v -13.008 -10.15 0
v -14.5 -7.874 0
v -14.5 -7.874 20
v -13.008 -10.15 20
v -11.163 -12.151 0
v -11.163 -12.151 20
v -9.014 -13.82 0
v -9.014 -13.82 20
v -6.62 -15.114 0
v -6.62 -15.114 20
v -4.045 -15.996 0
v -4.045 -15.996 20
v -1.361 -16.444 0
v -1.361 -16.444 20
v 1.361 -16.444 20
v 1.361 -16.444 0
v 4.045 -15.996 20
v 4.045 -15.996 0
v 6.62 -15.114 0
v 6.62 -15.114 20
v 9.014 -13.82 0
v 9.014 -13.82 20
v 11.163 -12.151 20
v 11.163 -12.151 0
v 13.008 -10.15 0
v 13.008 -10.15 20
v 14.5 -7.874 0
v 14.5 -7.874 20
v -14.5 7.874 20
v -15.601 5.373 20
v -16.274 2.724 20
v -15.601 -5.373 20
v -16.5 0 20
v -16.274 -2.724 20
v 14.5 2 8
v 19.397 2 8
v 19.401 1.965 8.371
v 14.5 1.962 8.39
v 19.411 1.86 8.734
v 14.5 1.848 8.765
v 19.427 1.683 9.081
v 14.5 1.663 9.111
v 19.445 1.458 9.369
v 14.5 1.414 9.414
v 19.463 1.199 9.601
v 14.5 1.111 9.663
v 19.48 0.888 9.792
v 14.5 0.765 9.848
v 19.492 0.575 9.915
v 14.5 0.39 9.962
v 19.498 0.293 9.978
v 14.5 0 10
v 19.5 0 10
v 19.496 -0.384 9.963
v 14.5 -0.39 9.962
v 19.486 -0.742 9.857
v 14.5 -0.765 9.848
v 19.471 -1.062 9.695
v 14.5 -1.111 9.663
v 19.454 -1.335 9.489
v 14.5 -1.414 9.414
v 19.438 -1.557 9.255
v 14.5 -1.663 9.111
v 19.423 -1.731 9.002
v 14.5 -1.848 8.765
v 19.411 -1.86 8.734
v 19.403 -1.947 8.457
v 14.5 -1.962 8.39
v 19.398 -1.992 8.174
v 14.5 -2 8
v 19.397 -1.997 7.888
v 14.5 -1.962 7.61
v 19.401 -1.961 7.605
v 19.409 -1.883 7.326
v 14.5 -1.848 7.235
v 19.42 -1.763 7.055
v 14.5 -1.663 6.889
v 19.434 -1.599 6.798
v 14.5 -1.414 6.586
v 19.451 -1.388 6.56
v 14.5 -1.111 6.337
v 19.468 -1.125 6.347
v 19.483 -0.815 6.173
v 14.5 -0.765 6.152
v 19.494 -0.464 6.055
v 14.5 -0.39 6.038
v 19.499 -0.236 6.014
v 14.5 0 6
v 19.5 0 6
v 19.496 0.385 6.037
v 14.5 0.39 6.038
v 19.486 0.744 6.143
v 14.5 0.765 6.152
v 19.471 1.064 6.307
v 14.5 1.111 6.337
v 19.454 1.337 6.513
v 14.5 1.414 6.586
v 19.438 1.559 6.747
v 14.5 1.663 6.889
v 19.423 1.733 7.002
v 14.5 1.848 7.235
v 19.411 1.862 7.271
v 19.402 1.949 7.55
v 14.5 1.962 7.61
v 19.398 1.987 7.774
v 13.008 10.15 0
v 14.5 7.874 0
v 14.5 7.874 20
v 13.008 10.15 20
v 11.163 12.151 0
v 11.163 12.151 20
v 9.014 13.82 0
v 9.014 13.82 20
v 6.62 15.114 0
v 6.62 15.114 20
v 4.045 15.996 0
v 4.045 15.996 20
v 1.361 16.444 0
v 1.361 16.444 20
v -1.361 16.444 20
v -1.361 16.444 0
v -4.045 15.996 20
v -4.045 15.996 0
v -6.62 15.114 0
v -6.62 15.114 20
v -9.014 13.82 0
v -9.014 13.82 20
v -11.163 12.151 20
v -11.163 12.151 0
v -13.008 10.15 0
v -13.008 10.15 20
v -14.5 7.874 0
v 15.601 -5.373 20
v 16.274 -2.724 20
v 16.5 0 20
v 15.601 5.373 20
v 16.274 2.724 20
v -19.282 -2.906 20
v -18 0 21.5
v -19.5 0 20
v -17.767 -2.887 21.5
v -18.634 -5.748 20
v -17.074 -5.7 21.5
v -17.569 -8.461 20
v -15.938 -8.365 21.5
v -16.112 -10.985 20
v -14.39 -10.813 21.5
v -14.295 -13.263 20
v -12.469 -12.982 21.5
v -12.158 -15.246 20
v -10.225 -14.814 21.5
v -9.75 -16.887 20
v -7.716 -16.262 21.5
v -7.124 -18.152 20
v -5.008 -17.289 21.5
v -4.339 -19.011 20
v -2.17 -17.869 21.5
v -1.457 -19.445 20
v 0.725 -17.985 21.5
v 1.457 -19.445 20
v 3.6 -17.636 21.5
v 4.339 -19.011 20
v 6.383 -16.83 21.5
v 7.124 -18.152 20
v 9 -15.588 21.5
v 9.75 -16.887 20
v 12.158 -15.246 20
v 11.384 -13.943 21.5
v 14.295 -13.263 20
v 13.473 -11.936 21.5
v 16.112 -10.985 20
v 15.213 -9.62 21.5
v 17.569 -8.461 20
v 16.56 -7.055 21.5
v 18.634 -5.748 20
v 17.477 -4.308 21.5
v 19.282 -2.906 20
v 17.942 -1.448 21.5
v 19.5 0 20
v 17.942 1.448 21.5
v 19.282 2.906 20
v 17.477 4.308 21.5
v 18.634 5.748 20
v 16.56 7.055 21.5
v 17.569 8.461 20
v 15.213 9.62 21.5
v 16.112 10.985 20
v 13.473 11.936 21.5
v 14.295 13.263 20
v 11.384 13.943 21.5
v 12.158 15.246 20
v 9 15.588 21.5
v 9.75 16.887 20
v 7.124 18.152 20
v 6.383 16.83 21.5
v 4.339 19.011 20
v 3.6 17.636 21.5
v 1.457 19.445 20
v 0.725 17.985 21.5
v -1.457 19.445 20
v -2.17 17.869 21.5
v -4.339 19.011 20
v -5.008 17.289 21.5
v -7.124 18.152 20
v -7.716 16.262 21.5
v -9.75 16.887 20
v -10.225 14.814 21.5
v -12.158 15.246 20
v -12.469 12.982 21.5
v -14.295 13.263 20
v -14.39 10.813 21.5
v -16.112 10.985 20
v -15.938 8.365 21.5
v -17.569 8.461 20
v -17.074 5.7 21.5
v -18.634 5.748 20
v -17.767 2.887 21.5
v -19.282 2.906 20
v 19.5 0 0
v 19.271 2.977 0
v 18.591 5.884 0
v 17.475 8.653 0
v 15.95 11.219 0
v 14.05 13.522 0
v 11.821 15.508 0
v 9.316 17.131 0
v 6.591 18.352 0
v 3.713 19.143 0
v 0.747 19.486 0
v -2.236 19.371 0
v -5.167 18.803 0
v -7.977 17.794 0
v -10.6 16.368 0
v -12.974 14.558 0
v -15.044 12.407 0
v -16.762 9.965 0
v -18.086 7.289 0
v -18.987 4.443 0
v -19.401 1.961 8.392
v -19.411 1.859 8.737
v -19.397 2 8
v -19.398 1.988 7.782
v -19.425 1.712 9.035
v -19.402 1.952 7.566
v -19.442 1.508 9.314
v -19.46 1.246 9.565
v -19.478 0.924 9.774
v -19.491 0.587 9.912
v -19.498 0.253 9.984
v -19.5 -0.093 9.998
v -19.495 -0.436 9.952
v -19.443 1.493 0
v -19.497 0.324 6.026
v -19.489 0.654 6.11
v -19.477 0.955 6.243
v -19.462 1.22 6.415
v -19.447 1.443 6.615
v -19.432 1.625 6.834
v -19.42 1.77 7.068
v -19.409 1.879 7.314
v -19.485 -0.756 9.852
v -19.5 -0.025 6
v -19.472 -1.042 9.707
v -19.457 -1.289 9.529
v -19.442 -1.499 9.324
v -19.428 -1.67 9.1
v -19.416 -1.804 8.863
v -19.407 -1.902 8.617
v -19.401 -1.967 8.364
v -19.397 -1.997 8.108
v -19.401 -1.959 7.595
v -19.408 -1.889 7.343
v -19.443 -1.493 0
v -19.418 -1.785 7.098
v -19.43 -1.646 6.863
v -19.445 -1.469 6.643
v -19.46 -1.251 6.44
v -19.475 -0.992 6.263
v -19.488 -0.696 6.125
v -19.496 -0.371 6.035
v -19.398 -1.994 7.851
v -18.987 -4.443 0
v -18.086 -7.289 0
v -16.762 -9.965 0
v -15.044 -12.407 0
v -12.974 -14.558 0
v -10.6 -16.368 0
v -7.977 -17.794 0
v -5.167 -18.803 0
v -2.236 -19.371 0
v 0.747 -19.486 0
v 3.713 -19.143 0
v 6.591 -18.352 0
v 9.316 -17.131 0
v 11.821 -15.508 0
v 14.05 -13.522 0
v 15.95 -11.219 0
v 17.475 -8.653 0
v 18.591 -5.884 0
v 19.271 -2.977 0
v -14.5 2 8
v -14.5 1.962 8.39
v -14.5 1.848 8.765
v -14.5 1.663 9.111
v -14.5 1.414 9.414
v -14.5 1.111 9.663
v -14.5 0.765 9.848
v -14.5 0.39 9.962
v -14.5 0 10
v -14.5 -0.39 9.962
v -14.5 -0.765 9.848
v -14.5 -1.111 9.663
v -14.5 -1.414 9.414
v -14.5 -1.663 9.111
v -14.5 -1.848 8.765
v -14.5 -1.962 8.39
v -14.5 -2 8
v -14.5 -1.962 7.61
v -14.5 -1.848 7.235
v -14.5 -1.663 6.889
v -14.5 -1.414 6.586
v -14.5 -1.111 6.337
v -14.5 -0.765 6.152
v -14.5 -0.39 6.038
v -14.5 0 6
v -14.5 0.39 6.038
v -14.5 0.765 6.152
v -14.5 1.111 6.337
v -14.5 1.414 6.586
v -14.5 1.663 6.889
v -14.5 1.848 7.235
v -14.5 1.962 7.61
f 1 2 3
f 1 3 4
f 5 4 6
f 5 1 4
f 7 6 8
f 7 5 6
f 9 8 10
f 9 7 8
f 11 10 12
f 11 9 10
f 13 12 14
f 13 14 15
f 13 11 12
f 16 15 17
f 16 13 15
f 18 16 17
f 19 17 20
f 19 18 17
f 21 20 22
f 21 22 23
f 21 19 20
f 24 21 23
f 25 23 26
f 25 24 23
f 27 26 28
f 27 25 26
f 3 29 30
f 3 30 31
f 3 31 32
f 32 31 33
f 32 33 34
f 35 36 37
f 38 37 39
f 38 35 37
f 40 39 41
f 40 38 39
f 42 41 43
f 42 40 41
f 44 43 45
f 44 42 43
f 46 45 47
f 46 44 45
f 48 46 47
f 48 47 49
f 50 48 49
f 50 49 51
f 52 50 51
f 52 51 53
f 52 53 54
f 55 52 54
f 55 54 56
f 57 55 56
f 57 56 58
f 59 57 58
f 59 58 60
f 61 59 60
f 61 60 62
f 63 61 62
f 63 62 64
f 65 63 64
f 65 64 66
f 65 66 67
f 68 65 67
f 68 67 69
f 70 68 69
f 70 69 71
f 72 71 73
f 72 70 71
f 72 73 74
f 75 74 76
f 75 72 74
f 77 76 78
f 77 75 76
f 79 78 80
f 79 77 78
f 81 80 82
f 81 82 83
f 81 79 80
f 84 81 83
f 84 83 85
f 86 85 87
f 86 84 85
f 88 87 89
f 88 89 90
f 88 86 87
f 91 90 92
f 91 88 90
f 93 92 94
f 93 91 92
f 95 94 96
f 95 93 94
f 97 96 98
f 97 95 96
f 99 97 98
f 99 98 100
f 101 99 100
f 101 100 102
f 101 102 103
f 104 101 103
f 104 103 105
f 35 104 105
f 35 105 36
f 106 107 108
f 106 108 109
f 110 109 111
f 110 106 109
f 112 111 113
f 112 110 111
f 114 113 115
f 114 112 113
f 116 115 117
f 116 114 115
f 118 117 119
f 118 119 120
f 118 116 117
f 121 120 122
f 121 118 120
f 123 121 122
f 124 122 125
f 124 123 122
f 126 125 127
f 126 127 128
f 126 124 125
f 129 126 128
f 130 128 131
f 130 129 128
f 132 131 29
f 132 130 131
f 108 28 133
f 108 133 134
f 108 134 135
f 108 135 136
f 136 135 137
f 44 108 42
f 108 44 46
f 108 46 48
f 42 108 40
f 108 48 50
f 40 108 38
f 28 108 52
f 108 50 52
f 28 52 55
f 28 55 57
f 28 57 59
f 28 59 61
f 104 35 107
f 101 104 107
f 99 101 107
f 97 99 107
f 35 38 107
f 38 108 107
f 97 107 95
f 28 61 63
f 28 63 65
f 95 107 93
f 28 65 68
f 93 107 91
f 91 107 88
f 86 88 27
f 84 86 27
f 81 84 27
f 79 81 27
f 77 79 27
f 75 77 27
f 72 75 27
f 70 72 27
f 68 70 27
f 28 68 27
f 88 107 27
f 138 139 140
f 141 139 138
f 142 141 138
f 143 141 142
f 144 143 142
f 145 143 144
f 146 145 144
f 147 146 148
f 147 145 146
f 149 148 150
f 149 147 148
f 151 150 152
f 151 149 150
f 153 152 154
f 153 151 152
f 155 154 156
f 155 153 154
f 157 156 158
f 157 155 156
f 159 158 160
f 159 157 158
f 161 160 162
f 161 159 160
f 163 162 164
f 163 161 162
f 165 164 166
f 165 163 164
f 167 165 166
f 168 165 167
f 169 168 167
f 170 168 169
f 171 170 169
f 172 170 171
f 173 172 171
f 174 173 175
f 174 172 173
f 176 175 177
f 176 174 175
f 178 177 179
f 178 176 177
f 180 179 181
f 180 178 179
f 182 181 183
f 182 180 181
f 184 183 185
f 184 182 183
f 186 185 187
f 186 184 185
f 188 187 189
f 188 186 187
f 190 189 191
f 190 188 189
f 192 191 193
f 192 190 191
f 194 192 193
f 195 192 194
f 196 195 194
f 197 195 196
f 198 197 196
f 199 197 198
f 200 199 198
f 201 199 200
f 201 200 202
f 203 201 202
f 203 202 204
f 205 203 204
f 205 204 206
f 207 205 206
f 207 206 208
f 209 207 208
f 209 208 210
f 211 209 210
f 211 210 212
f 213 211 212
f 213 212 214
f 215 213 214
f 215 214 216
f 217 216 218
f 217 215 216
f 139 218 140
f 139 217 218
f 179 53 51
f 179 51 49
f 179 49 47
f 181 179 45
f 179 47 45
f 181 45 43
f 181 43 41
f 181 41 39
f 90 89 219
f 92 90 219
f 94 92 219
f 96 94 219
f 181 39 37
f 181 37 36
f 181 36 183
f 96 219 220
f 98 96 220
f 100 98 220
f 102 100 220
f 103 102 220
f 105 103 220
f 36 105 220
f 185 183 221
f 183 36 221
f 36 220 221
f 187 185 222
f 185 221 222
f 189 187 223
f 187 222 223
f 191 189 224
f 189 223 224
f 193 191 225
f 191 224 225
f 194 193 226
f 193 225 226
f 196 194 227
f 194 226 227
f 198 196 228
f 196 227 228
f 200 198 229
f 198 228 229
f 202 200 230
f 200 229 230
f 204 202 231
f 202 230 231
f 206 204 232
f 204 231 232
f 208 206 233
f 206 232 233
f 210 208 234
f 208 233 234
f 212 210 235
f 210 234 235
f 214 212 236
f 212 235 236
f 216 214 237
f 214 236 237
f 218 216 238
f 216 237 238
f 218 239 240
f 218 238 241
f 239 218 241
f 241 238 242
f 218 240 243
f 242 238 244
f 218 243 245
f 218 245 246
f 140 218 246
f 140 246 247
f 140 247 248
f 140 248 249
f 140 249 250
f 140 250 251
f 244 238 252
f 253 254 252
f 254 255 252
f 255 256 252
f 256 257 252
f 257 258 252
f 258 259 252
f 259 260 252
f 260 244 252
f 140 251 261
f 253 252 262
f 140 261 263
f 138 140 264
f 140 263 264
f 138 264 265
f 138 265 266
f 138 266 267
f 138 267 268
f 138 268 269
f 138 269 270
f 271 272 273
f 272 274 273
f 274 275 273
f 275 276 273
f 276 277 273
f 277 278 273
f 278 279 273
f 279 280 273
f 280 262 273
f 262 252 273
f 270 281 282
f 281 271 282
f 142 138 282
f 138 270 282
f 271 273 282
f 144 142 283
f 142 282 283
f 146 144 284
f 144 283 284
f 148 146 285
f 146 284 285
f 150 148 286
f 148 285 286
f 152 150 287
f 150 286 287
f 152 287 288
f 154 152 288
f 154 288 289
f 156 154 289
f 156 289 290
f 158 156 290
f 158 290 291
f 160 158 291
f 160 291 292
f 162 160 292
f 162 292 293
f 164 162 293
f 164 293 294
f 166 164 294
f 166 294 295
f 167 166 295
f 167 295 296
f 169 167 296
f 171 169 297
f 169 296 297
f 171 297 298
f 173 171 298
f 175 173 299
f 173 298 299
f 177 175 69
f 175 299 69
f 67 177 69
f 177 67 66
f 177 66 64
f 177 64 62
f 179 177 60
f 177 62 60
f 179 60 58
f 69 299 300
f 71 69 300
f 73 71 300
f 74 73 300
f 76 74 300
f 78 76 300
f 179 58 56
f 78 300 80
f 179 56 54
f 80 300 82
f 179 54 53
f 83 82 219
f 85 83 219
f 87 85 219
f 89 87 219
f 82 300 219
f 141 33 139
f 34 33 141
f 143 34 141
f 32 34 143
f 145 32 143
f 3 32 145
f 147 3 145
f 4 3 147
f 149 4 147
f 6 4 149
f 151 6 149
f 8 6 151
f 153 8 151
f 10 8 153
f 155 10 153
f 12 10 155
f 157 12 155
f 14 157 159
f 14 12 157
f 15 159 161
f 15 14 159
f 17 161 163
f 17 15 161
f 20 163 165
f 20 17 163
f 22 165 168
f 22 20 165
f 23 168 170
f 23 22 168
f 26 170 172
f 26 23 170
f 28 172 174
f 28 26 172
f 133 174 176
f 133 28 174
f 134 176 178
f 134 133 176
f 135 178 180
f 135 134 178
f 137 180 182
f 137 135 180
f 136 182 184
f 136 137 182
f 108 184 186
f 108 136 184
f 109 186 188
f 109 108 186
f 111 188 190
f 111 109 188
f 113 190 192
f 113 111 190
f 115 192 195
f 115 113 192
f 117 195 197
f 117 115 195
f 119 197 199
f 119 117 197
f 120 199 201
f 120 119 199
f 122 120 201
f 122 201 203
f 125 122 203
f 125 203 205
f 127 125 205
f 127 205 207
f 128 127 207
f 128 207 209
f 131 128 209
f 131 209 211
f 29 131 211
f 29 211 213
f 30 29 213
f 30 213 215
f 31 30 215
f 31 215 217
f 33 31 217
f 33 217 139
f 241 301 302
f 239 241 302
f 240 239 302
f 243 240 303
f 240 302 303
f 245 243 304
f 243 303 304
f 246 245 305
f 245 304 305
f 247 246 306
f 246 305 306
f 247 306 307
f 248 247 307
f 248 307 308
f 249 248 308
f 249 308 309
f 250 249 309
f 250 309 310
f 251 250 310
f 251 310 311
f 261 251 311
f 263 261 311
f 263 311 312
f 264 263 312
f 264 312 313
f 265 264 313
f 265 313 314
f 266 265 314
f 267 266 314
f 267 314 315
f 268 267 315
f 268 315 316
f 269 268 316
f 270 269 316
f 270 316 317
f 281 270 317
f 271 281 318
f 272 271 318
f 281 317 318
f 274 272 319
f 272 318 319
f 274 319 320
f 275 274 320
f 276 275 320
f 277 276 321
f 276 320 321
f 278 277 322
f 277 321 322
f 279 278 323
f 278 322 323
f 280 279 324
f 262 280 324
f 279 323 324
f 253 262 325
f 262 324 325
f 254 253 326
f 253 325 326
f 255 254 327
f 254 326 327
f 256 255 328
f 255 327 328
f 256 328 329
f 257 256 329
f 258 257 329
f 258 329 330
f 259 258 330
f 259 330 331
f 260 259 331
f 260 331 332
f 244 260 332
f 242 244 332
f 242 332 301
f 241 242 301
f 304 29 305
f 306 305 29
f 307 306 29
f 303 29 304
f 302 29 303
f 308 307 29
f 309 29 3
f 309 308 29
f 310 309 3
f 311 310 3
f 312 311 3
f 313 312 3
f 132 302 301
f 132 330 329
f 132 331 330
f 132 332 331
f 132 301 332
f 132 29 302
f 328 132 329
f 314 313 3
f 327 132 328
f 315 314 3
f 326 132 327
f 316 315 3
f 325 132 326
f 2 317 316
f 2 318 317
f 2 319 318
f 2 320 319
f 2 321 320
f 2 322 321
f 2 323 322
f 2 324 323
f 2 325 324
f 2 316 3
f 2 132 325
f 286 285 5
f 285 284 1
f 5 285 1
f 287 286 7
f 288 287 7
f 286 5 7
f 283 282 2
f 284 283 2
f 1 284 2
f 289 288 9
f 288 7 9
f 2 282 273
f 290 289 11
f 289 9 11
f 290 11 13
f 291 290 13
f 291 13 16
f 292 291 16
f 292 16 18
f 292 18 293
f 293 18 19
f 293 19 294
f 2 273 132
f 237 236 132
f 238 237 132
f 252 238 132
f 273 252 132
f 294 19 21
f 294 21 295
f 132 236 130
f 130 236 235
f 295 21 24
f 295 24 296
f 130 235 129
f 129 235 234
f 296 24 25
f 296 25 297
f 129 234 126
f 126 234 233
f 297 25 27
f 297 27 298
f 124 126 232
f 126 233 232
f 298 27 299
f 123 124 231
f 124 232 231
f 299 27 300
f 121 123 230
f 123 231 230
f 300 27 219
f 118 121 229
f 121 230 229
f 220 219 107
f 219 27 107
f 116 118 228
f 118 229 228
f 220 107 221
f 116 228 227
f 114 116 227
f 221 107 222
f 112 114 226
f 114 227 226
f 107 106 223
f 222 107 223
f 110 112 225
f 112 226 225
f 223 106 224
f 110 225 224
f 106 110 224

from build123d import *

# Parameters (mm, degrees)
SKETCH_R          = 19.5
PAD_DEPTH         = 20
SKETCH002_R       = 2
POCKET_DEPTH      = 21
POCKET_DEPTH_BACK = -21


with BuildPart() as part:
    # Sketch → Pad (new body)
    with BuildSketch(Plane.XY):
        Circle(SKETCH_R)
        with BuildLine():
            ThreePointArc((14.5, 7.874008), (0, 16.5), (-14.5, 7.874008))
            Line((-14.5, 7.874008), (-14.5, -7.874008))
            ThreePointArc((-14.5, -7.874008), (0, -16.5), (14.5, -7.874008))
            Line((14.5, 7.874008), (14.5, -7.874008))
        make_face(mode=Mode.SUBTRACT)
    extrude(amount=PAD_DEPTH)

    # Sketch001 → Revolution (revolve)
    with BuildSketch(Plane.XZ):
        Polygon((-19.5, 20), (-18, 21.5), (-16.5, 20), align=None)
    revolve(axis=Axis((0, 0, 0), (0, 0, 1)))

    # Sketch002 → Pocket (cut, two sides)
    with BuildSketch(Plane.YZ) as pocket_sk:
        with Locations((0, 8)):
            Circle(SKETCH002_R)
    extrude(amount=-POCKET_DEPTH, mode=Mode.SUBTRACT)
    extrude(pocket_sk.sketch, amount=-POCKET_DEPTH_BACK, mode=Mode.SUBTRACT)


solid = part.part
